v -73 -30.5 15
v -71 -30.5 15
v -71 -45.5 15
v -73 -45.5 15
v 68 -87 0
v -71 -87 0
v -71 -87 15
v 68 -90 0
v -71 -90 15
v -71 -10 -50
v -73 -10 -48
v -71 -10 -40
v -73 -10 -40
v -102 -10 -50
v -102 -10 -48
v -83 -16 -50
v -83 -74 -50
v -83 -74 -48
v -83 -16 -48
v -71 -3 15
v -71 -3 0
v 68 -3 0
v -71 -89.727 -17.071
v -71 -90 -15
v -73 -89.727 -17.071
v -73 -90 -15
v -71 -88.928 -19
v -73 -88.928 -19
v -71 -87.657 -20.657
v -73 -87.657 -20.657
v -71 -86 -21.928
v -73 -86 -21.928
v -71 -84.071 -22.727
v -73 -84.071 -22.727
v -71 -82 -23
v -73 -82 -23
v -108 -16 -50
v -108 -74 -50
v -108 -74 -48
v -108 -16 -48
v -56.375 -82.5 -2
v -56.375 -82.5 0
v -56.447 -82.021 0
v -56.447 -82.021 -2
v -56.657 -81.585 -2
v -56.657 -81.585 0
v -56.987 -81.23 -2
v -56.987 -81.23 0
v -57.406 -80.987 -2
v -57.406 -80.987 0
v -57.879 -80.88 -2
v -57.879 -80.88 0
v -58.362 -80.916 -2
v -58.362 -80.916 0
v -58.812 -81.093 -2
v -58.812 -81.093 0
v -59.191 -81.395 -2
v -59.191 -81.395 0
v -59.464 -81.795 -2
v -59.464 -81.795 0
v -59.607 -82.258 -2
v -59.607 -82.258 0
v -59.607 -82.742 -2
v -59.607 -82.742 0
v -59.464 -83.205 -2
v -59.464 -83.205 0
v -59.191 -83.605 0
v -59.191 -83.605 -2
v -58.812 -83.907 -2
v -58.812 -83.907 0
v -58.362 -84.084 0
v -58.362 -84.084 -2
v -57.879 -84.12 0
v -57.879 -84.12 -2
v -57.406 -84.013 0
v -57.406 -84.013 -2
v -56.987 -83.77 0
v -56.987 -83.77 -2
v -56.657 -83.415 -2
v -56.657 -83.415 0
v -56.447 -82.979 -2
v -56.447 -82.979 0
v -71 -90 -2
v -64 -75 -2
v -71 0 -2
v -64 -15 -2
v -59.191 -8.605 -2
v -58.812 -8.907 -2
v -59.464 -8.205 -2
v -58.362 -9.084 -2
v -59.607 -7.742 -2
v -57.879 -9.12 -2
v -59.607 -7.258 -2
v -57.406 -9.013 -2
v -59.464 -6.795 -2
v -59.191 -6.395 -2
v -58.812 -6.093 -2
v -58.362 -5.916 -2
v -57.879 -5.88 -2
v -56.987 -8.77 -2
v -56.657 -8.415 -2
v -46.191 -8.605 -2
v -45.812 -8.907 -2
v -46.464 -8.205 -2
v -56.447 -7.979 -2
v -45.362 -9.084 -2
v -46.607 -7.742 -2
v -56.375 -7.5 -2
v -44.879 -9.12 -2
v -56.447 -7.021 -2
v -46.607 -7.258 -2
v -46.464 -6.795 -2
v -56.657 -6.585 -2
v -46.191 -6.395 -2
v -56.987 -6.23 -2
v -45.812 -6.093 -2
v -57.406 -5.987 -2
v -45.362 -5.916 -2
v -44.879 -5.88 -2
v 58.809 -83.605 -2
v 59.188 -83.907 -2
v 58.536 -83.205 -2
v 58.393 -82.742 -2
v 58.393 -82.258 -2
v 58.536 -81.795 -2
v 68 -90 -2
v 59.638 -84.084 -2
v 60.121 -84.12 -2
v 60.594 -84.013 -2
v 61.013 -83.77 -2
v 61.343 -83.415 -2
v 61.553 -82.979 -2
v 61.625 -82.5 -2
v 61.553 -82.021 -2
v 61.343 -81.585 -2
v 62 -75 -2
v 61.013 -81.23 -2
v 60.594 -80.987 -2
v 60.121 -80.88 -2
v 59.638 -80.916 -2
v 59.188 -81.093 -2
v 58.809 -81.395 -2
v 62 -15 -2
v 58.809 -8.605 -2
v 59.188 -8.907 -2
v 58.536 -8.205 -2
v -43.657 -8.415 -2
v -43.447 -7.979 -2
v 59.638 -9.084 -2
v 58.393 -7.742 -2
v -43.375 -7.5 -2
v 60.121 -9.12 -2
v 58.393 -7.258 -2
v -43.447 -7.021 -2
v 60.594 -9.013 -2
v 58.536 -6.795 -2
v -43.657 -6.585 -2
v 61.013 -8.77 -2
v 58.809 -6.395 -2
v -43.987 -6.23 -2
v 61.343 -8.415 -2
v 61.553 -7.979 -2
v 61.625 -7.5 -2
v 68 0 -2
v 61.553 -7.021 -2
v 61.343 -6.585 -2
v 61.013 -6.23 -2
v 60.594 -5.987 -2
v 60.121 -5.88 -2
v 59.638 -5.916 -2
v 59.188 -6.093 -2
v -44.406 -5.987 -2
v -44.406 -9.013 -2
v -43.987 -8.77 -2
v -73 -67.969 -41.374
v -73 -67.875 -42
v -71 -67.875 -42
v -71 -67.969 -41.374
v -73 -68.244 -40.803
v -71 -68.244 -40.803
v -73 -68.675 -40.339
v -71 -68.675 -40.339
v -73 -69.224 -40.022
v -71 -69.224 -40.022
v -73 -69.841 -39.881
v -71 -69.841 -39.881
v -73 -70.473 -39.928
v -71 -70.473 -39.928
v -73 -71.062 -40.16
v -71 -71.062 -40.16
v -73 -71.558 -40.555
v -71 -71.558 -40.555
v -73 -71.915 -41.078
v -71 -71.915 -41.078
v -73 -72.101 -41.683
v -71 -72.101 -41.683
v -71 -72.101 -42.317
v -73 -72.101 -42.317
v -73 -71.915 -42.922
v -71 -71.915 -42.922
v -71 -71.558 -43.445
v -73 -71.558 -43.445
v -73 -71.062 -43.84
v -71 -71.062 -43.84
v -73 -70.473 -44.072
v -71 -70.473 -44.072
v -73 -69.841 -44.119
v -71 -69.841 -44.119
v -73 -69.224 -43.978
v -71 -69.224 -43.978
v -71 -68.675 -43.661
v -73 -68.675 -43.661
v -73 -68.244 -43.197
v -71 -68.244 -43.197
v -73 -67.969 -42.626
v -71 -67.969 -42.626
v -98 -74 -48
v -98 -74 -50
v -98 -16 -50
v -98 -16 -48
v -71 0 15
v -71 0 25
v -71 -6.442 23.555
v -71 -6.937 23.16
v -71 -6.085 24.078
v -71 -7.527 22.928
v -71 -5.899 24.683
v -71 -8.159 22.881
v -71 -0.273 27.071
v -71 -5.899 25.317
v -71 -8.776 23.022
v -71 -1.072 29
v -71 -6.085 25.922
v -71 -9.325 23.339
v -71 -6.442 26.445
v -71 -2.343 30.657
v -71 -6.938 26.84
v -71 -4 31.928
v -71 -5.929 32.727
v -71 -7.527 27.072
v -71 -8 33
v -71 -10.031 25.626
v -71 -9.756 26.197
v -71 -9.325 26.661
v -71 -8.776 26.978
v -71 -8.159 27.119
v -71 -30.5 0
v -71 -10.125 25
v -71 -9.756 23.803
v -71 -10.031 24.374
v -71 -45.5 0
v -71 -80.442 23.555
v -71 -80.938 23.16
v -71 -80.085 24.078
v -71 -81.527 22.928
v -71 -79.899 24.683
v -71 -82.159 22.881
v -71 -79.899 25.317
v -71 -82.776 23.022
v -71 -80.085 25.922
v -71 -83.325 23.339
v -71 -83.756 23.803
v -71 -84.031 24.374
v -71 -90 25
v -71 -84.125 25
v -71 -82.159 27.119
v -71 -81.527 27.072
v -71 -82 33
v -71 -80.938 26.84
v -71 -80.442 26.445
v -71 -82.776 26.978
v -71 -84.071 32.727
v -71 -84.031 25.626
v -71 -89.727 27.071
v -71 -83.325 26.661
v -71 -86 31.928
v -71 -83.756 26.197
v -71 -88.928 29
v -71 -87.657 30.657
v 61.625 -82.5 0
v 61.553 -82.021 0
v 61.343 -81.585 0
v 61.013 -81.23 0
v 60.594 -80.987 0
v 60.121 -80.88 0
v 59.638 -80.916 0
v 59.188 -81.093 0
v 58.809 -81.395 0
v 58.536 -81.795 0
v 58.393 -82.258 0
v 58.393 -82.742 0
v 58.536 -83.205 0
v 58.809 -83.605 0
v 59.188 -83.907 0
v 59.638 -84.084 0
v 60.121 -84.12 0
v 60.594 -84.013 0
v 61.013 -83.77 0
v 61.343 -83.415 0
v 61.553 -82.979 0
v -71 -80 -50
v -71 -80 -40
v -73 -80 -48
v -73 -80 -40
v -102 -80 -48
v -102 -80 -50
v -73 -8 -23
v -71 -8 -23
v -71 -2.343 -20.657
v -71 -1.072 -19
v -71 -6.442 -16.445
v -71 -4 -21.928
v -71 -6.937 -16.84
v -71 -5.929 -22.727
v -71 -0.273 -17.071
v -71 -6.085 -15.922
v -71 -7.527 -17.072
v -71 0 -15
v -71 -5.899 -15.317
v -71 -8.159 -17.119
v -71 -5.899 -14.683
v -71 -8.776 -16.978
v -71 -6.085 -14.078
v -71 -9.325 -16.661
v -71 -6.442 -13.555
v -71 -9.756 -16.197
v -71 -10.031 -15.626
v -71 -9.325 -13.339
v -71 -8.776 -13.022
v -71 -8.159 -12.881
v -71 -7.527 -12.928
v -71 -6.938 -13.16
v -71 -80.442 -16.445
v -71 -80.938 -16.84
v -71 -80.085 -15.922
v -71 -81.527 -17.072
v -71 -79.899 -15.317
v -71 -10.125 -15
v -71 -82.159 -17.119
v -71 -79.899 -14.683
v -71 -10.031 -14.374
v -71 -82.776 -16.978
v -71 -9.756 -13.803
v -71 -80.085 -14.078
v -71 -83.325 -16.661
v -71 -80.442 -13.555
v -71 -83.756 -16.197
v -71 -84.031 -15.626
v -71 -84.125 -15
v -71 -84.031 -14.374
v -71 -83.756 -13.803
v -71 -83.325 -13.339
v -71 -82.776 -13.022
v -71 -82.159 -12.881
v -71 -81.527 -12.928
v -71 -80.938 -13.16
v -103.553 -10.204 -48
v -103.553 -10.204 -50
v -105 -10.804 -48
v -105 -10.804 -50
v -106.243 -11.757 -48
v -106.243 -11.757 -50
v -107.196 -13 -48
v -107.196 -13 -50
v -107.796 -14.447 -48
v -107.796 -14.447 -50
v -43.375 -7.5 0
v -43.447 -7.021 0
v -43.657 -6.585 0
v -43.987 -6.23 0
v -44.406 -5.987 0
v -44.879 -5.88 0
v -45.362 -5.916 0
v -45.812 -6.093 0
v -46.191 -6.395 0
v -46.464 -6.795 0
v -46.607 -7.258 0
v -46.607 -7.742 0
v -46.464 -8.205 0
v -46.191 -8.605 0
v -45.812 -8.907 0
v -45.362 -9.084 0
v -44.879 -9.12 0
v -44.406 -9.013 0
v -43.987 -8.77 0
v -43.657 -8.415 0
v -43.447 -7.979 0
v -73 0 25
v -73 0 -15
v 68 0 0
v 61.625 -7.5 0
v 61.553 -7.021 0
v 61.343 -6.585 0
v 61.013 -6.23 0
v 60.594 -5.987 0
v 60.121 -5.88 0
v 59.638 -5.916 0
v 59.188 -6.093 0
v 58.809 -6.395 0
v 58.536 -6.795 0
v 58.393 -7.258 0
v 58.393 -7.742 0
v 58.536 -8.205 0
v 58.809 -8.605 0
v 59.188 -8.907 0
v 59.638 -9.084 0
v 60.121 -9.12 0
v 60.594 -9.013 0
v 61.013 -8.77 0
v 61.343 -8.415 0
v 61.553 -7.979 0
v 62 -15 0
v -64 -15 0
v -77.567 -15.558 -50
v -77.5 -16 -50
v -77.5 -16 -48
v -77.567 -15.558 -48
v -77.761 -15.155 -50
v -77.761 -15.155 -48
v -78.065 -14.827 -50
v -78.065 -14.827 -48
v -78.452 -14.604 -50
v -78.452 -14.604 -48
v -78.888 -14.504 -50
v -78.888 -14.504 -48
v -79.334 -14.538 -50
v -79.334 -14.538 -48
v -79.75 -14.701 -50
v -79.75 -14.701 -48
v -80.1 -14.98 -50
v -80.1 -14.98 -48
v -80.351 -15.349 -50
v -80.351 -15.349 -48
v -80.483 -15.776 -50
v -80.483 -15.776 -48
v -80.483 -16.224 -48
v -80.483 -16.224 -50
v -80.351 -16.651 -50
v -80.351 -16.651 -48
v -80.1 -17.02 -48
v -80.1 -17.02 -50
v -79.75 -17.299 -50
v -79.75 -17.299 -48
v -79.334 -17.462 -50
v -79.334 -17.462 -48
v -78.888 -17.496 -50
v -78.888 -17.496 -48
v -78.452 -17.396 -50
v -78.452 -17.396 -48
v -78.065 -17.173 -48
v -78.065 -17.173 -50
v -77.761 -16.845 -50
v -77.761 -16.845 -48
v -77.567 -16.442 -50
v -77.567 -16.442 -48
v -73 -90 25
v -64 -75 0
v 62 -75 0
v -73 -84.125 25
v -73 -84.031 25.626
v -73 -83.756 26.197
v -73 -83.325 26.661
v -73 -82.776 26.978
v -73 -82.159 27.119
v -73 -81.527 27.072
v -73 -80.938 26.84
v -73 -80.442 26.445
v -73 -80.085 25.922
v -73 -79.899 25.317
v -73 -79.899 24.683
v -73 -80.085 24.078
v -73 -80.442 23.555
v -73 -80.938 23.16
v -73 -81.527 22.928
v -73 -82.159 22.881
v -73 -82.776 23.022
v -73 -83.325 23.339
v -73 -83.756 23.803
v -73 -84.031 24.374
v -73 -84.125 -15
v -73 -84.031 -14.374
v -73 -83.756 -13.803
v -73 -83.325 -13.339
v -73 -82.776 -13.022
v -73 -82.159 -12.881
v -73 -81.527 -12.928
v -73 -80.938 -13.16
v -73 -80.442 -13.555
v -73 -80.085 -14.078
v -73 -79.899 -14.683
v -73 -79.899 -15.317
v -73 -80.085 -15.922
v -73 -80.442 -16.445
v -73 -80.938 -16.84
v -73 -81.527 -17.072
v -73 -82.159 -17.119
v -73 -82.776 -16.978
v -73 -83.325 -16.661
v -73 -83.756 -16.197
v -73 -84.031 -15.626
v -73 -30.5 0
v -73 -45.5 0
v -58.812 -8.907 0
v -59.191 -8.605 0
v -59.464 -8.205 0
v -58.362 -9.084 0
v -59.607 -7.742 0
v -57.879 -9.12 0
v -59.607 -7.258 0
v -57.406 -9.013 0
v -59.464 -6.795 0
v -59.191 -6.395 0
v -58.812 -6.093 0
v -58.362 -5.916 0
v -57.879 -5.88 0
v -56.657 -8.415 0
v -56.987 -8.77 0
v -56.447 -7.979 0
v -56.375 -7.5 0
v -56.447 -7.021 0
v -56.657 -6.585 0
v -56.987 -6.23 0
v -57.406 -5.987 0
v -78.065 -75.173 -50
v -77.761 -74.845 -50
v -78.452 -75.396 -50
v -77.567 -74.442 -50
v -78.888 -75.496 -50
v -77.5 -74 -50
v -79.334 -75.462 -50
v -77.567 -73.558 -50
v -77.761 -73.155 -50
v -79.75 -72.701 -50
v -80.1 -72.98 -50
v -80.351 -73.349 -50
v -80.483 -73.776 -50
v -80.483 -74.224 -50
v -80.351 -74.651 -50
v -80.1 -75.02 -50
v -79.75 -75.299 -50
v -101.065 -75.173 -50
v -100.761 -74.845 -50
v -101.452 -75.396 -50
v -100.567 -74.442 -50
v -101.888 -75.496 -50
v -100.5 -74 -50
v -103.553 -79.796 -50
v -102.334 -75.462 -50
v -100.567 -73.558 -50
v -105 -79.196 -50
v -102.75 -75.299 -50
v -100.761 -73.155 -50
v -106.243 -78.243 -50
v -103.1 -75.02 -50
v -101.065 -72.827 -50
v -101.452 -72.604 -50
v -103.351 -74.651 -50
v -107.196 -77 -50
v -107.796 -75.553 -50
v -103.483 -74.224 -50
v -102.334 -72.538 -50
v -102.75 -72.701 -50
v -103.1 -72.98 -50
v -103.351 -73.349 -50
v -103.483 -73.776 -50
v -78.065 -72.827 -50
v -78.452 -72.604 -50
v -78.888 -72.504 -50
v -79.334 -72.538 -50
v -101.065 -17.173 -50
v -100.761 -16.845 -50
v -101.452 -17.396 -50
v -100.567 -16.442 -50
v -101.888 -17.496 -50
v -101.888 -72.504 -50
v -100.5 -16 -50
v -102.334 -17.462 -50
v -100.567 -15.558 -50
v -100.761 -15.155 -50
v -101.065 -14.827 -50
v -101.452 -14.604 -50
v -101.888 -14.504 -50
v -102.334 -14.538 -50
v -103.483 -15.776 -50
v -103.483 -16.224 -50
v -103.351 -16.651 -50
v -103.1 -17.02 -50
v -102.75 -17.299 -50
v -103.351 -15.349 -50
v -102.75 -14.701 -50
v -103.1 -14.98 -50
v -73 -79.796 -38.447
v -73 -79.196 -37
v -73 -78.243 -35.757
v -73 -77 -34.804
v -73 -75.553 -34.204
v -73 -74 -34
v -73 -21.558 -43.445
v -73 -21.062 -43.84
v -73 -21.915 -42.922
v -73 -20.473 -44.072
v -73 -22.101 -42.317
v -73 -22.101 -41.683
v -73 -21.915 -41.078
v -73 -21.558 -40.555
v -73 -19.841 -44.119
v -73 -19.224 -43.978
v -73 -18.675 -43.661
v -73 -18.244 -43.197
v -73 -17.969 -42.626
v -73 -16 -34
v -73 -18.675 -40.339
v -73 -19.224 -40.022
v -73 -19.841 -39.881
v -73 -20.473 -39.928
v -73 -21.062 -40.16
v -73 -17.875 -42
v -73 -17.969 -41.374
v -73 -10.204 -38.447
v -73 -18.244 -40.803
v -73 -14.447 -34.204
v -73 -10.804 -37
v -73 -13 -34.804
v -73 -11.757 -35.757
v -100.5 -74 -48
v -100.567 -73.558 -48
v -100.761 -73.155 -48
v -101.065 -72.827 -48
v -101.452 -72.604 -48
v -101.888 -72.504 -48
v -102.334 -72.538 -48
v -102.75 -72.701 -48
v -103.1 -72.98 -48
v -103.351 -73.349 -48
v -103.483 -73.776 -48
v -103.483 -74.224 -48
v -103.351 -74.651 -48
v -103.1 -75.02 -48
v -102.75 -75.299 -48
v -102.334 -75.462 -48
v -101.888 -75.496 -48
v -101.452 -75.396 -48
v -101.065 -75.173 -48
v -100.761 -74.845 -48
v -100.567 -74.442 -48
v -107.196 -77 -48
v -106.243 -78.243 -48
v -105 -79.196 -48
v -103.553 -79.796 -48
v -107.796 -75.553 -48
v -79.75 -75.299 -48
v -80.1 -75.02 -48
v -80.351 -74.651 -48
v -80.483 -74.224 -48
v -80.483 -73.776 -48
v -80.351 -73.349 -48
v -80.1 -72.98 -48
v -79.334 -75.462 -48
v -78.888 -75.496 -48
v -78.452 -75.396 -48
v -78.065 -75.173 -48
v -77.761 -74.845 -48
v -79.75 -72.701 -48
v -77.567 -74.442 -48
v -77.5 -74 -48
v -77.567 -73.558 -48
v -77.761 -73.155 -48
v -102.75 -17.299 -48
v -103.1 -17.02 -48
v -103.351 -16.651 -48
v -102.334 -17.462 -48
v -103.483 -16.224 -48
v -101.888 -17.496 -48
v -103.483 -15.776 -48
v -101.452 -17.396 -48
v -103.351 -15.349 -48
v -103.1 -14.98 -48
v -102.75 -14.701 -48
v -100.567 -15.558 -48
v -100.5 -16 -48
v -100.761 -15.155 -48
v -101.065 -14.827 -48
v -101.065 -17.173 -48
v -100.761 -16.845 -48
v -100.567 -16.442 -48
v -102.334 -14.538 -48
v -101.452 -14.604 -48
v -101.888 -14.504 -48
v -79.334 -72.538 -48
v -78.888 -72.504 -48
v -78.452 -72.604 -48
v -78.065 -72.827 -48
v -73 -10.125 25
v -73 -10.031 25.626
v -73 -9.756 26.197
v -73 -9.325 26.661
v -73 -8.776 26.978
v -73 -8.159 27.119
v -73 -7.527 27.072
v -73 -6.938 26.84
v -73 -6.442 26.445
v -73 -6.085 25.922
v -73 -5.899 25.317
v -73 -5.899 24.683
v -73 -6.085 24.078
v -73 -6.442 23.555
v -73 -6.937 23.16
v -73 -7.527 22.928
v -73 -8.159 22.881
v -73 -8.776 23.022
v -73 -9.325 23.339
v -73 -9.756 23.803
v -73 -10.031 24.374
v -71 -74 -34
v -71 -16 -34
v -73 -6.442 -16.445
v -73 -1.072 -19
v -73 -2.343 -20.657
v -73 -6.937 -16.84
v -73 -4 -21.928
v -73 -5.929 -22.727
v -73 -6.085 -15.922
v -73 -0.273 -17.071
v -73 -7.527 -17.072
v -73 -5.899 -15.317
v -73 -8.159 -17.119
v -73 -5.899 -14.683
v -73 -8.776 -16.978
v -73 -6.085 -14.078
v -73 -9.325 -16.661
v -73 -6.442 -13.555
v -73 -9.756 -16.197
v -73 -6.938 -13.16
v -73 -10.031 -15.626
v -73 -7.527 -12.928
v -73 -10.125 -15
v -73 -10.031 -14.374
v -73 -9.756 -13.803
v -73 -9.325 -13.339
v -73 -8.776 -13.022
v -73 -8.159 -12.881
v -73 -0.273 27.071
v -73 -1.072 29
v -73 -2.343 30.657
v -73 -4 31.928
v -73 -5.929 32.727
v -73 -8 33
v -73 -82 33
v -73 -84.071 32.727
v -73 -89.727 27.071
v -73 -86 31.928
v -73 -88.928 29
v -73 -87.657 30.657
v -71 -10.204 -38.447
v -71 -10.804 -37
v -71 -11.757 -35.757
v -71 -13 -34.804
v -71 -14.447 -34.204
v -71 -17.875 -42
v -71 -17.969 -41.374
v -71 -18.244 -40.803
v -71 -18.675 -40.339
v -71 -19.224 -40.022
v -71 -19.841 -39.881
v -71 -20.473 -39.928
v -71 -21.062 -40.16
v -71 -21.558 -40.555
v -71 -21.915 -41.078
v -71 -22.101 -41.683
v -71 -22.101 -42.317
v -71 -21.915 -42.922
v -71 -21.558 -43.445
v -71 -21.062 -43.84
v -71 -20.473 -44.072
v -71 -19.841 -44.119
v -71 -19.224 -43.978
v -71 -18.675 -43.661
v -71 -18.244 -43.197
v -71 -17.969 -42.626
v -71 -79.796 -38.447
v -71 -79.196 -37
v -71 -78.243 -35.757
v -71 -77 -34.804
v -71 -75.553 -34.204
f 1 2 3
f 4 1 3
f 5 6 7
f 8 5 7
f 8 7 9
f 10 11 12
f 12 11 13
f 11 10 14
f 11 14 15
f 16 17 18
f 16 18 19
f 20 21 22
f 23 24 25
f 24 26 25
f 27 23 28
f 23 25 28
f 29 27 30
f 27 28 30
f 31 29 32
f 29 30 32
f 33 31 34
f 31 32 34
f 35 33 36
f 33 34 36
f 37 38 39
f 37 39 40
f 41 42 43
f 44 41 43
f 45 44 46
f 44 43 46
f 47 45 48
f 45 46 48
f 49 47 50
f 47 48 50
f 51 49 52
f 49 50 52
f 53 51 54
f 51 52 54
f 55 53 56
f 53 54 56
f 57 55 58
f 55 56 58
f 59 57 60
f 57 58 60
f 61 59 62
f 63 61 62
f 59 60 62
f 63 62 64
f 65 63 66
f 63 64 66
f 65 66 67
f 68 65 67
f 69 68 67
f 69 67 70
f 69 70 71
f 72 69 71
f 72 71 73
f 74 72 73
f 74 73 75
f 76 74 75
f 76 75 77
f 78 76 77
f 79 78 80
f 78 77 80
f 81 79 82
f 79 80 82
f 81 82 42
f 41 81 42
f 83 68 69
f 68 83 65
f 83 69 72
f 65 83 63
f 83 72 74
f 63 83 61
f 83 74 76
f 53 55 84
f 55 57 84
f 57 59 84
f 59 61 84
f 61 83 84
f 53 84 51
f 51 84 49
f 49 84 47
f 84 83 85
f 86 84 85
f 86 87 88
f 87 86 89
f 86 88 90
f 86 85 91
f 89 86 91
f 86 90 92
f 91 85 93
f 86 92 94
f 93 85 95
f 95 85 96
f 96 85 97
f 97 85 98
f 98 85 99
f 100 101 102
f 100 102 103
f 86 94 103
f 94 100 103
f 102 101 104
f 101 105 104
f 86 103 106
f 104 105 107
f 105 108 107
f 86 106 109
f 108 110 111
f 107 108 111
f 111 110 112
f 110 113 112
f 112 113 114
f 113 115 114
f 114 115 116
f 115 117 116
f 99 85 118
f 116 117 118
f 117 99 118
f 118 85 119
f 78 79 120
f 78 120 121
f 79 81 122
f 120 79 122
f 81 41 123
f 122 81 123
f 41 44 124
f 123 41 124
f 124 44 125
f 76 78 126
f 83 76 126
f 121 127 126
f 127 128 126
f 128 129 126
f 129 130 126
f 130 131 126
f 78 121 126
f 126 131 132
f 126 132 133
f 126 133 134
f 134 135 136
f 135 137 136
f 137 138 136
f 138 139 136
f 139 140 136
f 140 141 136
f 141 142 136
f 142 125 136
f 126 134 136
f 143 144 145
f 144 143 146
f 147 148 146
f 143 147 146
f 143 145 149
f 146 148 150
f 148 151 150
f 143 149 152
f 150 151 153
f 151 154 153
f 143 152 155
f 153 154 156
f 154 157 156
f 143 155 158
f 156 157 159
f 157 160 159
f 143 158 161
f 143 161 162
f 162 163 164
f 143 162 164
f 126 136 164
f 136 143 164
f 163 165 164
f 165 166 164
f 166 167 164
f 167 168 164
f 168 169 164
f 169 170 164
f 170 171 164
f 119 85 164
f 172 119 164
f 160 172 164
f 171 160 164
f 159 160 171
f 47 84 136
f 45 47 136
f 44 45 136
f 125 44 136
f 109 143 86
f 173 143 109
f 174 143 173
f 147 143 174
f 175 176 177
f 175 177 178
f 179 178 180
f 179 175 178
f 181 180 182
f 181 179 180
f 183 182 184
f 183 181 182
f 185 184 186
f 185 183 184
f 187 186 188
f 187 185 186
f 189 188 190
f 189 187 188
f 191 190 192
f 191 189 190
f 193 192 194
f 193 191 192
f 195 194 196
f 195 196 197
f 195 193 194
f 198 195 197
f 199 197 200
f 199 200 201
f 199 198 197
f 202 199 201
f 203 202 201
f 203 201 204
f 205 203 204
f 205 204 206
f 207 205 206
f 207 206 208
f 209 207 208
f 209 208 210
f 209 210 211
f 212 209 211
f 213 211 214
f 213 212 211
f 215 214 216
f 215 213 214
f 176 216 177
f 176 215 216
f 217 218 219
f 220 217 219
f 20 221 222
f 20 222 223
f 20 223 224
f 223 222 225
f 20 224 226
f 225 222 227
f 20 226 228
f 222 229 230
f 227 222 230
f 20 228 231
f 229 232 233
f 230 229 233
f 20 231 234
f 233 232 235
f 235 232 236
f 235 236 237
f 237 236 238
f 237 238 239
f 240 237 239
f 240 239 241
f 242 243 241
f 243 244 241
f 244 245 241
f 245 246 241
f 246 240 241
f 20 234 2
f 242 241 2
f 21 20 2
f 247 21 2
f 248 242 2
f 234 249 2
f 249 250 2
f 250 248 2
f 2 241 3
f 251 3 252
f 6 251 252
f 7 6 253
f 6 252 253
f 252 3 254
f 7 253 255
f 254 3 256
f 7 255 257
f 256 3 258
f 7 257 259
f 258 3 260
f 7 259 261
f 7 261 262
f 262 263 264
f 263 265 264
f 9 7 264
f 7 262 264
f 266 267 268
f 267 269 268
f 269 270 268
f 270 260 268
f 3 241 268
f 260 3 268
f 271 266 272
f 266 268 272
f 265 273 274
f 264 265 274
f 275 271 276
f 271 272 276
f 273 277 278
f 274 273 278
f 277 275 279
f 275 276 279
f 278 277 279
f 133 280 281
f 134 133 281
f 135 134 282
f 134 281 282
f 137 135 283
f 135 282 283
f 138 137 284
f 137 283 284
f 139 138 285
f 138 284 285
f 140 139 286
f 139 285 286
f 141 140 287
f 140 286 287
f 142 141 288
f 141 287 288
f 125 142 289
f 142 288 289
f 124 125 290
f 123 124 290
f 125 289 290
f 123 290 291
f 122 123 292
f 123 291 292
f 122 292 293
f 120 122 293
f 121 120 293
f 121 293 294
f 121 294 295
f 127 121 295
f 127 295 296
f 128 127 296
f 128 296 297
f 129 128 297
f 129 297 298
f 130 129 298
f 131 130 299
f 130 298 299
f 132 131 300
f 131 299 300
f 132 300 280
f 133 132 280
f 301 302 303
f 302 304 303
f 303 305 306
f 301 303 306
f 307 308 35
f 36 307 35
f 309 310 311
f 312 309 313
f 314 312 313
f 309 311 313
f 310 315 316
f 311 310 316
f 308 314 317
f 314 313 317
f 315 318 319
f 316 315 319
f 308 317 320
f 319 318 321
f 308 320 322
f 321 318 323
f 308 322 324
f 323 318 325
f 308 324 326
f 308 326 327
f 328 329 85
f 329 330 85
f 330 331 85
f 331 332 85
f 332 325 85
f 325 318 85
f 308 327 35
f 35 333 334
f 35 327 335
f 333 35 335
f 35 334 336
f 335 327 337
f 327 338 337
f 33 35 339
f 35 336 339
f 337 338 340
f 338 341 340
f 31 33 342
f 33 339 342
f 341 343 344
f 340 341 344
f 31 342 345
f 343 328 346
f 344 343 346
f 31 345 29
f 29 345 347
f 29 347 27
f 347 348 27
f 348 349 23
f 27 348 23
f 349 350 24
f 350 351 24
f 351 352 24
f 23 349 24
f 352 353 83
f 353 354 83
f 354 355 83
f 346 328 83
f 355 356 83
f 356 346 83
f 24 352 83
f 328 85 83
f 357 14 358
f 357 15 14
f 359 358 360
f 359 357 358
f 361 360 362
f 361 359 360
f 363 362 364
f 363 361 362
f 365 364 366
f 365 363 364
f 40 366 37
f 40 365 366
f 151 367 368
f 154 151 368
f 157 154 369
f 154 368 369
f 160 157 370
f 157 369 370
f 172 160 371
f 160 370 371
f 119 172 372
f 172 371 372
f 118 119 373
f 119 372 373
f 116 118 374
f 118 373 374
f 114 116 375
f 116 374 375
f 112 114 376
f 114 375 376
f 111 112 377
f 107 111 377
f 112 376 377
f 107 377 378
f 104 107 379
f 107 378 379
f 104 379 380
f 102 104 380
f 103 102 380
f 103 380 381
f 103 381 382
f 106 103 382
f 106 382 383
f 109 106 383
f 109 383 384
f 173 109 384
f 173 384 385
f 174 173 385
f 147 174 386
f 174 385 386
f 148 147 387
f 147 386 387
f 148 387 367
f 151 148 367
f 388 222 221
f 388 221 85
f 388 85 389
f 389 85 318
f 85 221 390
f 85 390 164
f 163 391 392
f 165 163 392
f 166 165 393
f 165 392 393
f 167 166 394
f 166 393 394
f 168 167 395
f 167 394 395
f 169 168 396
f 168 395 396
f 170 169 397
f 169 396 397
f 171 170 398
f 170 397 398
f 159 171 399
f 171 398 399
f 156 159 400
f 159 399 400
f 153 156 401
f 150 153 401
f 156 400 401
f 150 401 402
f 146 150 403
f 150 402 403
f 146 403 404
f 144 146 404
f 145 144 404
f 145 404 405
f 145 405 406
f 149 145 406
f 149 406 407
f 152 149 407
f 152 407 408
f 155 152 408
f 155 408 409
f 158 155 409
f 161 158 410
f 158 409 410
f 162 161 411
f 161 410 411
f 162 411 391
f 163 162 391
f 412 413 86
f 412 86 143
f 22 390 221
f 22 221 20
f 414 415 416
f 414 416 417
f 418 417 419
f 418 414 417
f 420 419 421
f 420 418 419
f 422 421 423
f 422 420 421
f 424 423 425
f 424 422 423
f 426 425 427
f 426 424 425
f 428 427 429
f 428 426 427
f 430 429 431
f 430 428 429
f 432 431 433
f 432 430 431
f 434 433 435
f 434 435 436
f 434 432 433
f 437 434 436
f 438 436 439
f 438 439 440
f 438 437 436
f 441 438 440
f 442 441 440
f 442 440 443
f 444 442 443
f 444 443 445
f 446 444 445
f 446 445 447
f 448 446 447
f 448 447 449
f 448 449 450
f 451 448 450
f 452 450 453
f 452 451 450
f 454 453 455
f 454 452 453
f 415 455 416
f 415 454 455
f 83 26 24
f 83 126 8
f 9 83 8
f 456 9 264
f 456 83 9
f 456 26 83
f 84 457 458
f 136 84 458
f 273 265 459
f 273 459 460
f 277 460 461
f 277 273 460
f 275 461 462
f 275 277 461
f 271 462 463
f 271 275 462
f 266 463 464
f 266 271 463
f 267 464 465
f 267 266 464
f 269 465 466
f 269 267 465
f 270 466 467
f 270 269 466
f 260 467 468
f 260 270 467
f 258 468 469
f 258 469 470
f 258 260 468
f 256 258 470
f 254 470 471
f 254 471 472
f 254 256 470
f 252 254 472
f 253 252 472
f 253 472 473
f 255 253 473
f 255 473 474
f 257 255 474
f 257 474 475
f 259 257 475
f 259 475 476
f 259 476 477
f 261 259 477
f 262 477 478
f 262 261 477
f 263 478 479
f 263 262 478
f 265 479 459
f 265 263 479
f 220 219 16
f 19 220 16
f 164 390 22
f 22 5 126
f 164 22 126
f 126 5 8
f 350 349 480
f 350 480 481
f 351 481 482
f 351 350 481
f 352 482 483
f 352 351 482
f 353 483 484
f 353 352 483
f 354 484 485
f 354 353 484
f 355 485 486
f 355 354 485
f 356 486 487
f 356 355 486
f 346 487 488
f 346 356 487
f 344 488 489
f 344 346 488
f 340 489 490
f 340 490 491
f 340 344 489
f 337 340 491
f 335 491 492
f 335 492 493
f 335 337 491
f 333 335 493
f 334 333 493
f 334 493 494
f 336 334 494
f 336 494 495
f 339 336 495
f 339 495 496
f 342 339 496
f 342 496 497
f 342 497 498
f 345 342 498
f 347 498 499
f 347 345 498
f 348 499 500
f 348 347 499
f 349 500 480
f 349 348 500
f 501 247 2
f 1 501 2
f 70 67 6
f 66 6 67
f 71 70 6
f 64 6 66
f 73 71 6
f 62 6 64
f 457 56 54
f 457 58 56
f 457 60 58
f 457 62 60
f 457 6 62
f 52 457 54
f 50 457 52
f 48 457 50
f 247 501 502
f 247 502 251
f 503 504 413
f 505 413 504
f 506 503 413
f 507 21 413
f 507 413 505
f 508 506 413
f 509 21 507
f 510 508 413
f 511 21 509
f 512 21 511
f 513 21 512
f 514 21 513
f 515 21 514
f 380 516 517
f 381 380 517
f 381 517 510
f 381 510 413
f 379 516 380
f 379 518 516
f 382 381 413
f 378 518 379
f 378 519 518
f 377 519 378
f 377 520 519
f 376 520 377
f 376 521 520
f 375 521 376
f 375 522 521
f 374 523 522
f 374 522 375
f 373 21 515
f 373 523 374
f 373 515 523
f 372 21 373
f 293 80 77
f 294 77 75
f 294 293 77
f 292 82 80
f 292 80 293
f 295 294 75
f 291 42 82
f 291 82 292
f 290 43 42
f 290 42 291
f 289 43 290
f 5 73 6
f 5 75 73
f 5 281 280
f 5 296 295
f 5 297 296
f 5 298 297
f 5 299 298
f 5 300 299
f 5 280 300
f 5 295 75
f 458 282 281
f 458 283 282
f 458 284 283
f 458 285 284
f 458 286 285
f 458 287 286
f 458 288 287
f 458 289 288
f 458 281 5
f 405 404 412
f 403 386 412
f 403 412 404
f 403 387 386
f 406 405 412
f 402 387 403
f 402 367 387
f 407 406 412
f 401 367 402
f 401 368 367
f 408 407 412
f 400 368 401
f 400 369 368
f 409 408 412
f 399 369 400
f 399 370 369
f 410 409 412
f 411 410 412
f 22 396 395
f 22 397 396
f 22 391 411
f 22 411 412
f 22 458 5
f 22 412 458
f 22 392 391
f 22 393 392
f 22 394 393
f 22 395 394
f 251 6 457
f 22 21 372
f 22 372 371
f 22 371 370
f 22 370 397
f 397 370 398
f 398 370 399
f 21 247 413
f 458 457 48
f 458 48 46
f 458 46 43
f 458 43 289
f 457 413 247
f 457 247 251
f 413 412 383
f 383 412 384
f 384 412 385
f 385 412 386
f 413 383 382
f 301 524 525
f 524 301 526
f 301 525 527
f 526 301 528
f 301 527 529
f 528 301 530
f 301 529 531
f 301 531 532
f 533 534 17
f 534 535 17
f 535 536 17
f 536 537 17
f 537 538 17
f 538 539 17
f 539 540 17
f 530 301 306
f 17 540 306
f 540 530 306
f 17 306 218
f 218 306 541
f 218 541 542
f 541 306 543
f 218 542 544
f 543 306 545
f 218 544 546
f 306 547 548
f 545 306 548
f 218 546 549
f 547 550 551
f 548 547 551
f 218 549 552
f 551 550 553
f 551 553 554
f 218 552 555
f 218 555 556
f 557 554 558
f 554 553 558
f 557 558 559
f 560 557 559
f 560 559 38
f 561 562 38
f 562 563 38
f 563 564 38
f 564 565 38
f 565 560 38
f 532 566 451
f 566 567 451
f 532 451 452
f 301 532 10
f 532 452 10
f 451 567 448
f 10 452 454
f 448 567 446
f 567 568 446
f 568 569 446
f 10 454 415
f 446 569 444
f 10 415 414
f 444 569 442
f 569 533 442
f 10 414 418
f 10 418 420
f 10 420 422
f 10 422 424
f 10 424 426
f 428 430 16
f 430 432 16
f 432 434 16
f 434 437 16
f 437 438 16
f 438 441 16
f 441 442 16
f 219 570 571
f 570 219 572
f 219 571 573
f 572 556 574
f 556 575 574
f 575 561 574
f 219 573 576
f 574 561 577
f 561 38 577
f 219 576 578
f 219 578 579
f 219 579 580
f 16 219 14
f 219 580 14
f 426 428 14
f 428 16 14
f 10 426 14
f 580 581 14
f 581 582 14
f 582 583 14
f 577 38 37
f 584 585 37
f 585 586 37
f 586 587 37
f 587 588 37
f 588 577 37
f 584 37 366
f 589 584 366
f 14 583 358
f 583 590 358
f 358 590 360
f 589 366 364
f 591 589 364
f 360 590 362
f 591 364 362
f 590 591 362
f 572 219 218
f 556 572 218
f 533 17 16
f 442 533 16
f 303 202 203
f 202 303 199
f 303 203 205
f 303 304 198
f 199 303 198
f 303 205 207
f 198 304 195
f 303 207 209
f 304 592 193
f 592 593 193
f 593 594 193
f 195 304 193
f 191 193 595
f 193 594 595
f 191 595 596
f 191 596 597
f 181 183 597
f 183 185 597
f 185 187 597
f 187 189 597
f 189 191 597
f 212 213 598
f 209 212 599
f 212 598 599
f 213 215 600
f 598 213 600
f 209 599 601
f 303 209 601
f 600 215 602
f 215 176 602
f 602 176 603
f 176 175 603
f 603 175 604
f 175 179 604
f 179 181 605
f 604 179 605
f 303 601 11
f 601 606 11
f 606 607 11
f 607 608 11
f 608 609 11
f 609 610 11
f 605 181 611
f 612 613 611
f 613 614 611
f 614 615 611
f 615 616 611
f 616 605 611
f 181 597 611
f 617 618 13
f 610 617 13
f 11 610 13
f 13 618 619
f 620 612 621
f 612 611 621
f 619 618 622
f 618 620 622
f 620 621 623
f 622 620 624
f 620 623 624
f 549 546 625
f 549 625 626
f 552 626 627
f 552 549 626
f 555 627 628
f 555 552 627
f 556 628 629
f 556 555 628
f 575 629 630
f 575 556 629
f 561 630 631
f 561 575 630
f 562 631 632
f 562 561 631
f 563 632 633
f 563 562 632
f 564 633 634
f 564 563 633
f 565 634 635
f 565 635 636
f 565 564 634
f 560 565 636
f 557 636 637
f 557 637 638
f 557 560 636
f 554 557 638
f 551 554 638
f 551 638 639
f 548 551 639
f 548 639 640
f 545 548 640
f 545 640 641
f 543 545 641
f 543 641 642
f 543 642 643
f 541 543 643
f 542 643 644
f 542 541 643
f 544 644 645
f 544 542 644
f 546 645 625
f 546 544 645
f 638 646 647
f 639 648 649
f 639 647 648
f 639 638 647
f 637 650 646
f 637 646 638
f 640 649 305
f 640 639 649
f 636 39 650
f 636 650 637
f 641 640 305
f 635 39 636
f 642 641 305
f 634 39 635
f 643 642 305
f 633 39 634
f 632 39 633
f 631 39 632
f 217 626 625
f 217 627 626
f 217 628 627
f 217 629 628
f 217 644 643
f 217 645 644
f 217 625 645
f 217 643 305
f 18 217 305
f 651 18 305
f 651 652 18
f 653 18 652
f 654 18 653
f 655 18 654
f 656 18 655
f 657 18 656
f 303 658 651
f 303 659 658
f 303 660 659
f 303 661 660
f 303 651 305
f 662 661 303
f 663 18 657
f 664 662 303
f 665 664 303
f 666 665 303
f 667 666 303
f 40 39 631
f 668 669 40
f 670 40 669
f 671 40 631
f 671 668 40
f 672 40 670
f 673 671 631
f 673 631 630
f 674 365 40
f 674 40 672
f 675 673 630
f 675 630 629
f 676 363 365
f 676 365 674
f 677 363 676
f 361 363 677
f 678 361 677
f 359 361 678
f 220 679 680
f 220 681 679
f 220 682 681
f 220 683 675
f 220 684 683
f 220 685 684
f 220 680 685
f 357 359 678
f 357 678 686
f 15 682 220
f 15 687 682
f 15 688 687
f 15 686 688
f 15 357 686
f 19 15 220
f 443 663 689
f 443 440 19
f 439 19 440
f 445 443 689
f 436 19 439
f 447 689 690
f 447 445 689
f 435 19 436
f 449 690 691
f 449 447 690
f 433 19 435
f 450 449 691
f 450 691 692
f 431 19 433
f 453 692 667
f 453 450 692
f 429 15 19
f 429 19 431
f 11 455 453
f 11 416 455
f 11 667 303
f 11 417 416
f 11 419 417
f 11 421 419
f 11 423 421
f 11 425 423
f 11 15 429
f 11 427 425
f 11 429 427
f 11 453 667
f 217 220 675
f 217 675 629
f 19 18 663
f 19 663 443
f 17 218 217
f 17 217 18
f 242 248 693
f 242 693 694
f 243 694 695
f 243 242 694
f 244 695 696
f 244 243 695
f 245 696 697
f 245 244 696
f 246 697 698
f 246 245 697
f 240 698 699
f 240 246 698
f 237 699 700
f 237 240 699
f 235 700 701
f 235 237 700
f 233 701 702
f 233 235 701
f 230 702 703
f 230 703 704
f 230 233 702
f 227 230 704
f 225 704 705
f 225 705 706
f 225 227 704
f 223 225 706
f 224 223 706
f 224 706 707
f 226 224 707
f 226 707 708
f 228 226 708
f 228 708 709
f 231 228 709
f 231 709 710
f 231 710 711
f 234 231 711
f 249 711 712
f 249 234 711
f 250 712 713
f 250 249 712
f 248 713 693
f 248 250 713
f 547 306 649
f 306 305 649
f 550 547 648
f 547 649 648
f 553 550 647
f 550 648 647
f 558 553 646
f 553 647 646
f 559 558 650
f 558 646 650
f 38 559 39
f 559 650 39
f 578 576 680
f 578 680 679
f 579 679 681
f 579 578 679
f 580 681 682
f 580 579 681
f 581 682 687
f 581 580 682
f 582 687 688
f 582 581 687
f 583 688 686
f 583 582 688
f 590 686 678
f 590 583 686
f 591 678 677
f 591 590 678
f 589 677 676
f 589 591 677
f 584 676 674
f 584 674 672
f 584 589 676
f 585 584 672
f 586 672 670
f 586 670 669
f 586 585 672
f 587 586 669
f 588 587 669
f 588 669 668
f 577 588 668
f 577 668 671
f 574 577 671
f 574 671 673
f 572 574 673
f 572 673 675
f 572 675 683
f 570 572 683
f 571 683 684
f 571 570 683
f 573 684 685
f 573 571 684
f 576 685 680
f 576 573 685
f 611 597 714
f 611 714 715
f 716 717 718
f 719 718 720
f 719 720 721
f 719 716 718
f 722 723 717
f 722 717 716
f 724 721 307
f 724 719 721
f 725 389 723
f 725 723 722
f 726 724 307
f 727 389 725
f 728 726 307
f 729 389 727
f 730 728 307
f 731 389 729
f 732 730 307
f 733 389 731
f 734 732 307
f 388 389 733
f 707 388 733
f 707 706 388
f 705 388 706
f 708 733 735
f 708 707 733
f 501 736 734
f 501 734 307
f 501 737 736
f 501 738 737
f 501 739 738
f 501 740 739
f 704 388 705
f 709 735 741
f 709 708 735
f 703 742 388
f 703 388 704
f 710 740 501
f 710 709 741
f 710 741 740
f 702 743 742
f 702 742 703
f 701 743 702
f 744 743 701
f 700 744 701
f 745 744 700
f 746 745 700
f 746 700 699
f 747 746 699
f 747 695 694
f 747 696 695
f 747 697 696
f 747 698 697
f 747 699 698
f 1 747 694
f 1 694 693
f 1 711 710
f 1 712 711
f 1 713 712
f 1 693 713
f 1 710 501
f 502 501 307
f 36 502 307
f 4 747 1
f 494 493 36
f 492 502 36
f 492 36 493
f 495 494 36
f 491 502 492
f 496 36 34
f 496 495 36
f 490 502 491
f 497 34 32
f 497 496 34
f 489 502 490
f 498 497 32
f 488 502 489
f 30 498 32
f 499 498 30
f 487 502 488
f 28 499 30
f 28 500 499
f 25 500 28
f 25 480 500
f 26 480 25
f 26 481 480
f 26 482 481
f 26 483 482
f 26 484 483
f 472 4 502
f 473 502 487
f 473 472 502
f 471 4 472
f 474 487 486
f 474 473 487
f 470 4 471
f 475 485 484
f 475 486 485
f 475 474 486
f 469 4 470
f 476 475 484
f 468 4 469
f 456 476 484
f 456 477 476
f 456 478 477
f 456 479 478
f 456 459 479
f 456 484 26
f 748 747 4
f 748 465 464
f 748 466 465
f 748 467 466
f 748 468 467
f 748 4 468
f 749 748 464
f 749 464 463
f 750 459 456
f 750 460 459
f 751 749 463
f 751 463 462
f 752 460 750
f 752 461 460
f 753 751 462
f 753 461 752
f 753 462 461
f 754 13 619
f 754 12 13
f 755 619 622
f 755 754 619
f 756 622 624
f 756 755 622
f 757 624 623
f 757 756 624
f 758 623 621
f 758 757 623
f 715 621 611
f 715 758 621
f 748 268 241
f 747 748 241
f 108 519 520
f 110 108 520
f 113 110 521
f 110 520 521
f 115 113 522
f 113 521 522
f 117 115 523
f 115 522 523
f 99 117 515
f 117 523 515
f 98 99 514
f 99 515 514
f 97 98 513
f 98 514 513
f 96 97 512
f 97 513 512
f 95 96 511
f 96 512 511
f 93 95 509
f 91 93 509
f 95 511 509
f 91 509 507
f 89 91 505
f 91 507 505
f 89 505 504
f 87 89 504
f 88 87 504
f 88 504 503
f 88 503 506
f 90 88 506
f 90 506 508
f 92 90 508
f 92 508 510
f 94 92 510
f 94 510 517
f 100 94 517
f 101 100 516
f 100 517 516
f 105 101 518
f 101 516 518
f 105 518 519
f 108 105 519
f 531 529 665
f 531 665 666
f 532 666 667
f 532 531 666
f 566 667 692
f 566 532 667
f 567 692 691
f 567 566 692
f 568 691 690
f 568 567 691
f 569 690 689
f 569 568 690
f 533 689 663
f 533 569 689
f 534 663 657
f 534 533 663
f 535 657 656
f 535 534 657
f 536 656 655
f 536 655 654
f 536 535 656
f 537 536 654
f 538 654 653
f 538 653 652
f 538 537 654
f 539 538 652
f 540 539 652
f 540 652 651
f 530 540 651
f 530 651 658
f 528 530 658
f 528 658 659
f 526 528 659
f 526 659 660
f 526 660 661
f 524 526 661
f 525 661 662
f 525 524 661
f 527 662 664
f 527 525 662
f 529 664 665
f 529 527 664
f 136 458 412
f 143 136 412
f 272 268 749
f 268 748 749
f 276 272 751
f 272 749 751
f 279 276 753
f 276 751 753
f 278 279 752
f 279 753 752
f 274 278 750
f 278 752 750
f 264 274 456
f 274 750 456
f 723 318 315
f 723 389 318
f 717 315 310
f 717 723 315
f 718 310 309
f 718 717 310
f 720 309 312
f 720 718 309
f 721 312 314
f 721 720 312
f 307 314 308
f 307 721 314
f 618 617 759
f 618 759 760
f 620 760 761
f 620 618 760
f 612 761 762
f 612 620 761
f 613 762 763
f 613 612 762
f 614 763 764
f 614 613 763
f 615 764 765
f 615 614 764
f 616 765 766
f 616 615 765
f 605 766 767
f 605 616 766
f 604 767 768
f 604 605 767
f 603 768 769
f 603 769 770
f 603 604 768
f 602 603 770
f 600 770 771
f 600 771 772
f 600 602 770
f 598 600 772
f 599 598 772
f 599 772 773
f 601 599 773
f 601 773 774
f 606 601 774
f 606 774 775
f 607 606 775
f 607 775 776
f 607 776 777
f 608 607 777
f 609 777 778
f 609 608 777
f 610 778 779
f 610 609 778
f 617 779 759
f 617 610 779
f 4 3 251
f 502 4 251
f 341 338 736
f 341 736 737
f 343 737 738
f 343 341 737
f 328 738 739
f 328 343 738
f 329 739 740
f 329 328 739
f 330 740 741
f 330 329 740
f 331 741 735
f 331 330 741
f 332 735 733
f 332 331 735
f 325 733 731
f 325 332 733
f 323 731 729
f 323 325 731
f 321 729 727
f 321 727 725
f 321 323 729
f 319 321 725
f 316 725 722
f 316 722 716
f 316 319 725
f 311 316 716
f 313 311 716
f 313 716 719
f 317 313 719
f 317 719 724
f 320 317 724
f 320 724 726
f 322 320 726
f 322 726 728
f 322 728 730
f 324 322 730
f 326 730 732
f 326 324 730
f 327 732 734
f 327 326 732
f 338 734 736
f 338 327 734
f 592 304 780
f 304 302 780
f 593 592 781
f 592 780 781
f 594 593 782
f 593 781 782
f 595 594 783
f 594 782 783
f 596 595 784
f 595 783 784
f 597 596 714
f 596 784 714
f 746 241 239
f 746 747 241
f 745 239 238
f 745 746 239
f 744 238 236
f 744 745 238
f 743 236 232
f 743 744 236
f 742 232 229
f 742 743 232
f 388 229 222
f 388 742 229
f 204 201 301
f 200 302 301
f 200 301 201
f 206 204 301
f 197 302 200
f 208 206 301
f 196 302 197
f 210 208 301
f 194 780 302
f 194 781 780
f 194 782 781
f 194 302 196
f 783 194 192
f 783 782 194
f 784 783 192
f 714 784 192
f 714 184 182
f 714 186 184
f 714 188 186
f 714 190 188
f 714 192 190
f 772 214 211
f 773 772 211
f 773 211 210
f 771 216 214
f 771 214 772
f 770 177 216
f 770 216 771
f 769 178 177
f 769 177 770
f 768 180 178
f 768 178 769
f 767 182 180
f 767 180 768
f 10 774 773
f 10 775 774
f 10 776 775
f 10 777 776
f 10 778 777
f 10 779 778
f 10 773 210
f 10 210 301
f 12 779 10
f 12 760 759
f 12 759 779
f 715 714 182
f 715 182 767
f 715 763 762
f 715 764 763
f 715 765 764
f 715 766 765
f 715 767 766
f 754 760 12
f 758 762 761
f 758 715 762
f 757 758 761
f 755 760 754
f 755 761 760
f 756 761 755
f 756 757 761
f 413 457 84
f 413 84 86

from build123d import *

# Parameters (mm, degrees)
F0_W       = 1
F0_H       = 90
F0_R       = 1.625
F0_W_2     = 126
F0_H_2     = 60
F1_DEPTH   = 2
F2_R       = 2.125
F2_W       = 90
F2_H       = 21
F3_DEPTH   = 2
F4_R       = 8
F5_W       = 3
F5_H       = 15
F6_DEPTH   = 139
F7_SIZE2   = 14.99999
F7_SIZE    = 138.99999
F7_2_SIZE2 = 14.99999
F7_2_SIZE  = 138.99999
F9_W       = 35
F9_H       = 70
F9_R       = 1.5
F9_W_2     = 15
F9_H_2     = 58
F10_DEPTH  = 2
F11_W      = 70
F11_H      = 14
F11_R      = 2.125
F11_H_2    = 2
F12_DEPTH  = 2
F13_R      = 6


# Not quite as in the source:
# - a fillet or chamfer is up to 0.001 mm smaller than in the source, because OpenCascade refuses the exact size
# - a feature names something its author has since deleted; it is built from what else it names


with BuildPart() as f1:
    # F0 (on Top) → F1 (new body)
    with BuildSketch(Plane.XY):
        with Locations((-70.5, -45)):
            Rectangle(F0_W, F0_H)
        Polygon((0, 0), (-70, 0), (-70, -90), (68, -90), (68, 0), align=None)
        with Locations((-58, -82.5)):
            Circle(F0_R, mode=Mode.SUBTRACT)
        with Locations((60, -82.5)):
            Circle(F0_R, mode=Mode.SUBTRACT)
        with Locations((-1, -45)):
            Rectangle(F0_W_2, F0_H_2, mode=Mode.SUBTRACT)
        with Locations((-58, -7.5)):
            Circle(F0_R, mode=Mode.SUBTRACT)
        with Locations((-45, -7.5)):
            Circle(F0_R, mode=Mode.SUBTRACT)
        with Locations((60, -7.5)):
            Circle(F0_R, mode=Mode.SUBTRACT)
    extrude(amount=-F1_DEPTH)

    # F2 (on face) → F3 (join)
    with BuildSketch(Plane(origin=(-71, 0, 0), x_dir=(0, -1, 0), z_dir=(-1, 0, 0))):
        Polygon((90, 33), (0, 33), (0, 0), (30.5, 0), (30.5, 15), (45.5, 15), (45.5, 0), (90, 0), align=None)
        with Locations((8, 25)):
            Circle(F2_R, mode=Mode.SUBTRACT)
        with Locations((82, 25)):
            Circle(F2_R, mode=Mode.SUBTRACT)
        with Locations((45, -12.5)):
            Rectangle(F2_W, F2_H)
        with Locations((8, -15)):
            Circle(F2_R, mode=Mode.SUBTRACT)
        with Locations((82, -15)):
            Circle(F2_R, mode=Mode.SUBTRACT)
        Polygon((30.5, 0), (0, 0), (0, -2), (90, -2), (90, 0), (45.5, 0), align=None)
    extrude(amount=F3_DEPTH)

    # F4
    f4_edges = [f1.edges().sort_by_distance(p)[0] for p in [
        (-72, -90, 33),
        (-72, -90, -23),
        (-72, 0, -23),
        (-72, 0, 33),
    ]]
    fillet(f4_edges, radius=F4_R)

    # F5 (on face) → F6 (join)
    with BuildSketch(Plane(origin=(-71, 0, 0), x_dir=(0, -1, 0), z_dir=(-1, 0, 0))):
        with Locations((88.5, 7.5)):
            Rectangle(F5_W, F5_H)
        with Locations((1.5, 7.5)):
            Rectangle(F5_W, F5_H)
    extrude(amount=-F6_DEPTH)

    # F7 (size 139 and 15 in the source; OpenCascade refuses exactly that, so slightly less here)
    f7_edges = [f1.edges().sort_by_distance(p)[0] for p in [
        (68, -88.5, 15),
    ]]
    f7_side = f1.faces().sort_by_distance((-1.5, -88.5, 15))[0]
    chamfer(f7_edges, length=F7_SIZE, length2=F7_SIZE2, reference=f7_side)

    # F7#2 (size 139 and 15 in the source; OpenCascade refuses exactly that, so slightly less here)
    f7_2_edges = [f1.edges().sort_by_distance(p)[0] for p in [
        (68, -1.5, 15),
    ]]
    f7_2_side = f1.faces().sort_by_distance((-1.5, -1.5, 15))[0]
    chamfer(f7_2_edges, length=F7_2_SIZE, length2=F7_2_SIZE2, reference=f7_2_side)


with BuildPart() as f10:
    # F9 (on offset) → F10 (new body)
    with BuildSketch(Plane.XY.offset(-50)):
        with Locations((-90.5, -45)):
            Rectangle(F9_W, F9_H)
        with Locations((-102, -74)):
            Circle(F9_R, mode=Mode.SUBTRACT)
        with Locations((-79, -74)):
            Circle(F9_R, mode=Mode.SUBTRACT)
        with Locations((-102, -16)):
            Circle(F9_R, mode=Mode.SUBTRACT)
        with Locations((-90.5, -45)):
            Rectangle(F9_W_2, F9_H_2, mode=Mode.SUBTRACT)
        with Locations((-79, -16)):
            Circle(F9_R, mode=Mode.SUBTRACT)
    extrude(amount=F10_DEPTH)

    # F11 (on face) → F12 (join)
    with BuildSketch(Plane.YZ.offset(-73)):
        with Locations((-45, -41)):
            Rectangle(F11_W, F11_H)
        with Locations((-70, -42)):
            Circle(F11_R, mode=Mode.SUBTRACT)
        with Locations((-20, -42)):
            Circle(F11_R, mode=Mode.SUBTRACT)
        with Locations((-45, -49)):
            Rectangle(F11_W, F11_H_2)
    extrude(amount=F12_DEPTH)

    # F13
    f13_edges = [f10.edges().sort_by_distance(p)[0] for p in [
        (-108, -10, -49),
        (-108, -80, -49),
        (-72, -80, -34),
        (-72, -10, -34),
    ]]
    fillet(f13_edges, radius=F13_R)


solid = Compound([f1.part, f10.part])
